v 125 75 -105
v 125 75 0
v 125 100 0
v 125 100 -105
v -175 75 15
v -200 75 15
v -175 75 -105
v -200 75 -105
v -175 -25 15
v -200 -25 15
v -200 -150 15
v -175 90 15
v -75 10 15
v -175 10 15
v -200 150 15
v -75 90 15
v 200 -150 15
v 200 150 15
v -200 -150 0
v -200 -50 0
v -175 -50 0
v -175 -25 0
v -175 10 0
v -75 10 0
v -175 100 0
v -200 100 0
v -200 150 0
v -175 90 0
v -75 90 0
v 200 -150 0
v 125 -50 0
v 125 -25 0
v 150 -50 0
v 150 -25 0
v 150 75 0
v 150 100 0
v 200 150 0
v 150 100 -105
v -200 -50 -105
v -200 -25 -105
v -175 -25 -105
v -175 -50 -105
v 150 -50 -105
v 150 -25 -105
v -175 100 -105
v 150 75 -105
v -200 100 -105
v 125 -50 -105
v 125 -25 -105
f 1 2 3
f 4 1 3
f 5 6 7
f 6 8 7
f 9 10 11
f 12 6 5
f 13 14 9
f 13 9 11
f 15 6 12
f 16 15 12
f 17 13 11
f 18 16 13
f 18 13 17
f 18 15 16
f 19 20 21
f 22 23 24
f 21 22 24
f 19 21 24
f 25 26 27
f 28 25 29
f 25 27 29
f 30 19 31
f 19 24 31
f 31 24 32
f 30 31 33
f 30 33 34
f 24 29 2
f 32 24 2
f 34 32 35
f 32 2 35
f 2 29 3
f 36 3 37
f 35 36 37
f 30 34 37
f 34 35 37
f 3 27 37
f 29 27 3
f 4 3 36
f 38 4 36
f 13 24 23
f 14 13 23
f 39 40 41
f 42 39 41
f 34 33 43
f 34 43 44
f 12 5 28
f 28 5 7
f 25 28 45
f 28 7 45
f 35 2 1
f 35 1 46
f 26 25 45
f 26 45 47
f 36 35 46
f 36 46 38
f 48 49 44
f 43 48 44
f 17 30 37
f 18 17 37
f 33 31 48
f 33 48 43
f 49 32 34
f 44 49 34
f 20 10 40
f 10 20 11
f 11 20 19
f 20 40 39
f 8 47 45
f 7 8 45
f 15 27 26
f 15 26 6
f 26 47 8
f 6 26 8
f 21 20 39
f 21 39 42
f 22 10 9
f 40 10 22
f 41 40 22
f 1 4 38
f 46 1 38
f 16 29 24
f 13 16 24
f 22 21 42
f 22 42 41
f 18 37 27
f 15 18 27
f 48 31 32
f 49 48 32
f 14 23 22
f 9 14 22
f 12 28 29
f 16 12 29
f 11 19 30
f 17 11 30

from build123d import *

# Parameters (mm, degrees)
F0_W     = 25
F0_H     = 25
F1_DEPTH = 15
F2_DEPTH = 105
F3_DEPTH = 15


with BuildPart() as f1:
    # F0 (on Top) → F1 (new body)
    with BuildSketch(Plane.XY):
        Polygon((200, 150), (-200, 150), (-200, 100), (-175, 100), (-175, 90), (-160, 90), (-75, 90), (-75, 10), (-160, 10), (-175, 10), (-175, -25), (-175, -50), (-200, -50), (-200, -150), (200, -150), align=None)
        with Locations((137.5, -37.5)):
            Rectangle(F0_W, F0_H, mode=Mode.SUBTRACT)
        with Locations((137.5, 87.5)):
            Rectangle(F0_W, F0_H, mode=Mode.SUBTRACT)
    extrude(amount=F1_DEPTH)

    # F0 (on Top) → F2 (join)
    with BuildSketch(Plane.XY):
        Polygon((-175, 100), (-200, 100), (-200, 75), (-175, 75), (-175, 90), align=None)
        with Locations((-187.5, -37.5)):
            Rectangle(F0_W, F0_H)
        with Locations((137.5, -37.5)):
            Rectangle(F0_W, F0_H)
        with Locations((137.5, 87.5)):
            Rectangle(F0_W, F0_H)
    extrude(amount=-F2_DEPTH)

    # F0 (on Top) → F3 (join)
    with BuildSketch(Plane.XY):
        with Locations((137.5, 87.5)):
            Rectangle(F0_W, F0_H)
        with Locations((137.5, -37.5)):
            Rectangle(F0_W, F0_H)
        with Locations((-187.5, -37.5)):
            Rectangle(F0_W, F0_H)
        Polygon((-175, 100), (-200, 100), (-200, 75), (-175, 75), (-175, 90), align=None)
    extrude(amount=F3_DEPTH)


solid = f1.part
